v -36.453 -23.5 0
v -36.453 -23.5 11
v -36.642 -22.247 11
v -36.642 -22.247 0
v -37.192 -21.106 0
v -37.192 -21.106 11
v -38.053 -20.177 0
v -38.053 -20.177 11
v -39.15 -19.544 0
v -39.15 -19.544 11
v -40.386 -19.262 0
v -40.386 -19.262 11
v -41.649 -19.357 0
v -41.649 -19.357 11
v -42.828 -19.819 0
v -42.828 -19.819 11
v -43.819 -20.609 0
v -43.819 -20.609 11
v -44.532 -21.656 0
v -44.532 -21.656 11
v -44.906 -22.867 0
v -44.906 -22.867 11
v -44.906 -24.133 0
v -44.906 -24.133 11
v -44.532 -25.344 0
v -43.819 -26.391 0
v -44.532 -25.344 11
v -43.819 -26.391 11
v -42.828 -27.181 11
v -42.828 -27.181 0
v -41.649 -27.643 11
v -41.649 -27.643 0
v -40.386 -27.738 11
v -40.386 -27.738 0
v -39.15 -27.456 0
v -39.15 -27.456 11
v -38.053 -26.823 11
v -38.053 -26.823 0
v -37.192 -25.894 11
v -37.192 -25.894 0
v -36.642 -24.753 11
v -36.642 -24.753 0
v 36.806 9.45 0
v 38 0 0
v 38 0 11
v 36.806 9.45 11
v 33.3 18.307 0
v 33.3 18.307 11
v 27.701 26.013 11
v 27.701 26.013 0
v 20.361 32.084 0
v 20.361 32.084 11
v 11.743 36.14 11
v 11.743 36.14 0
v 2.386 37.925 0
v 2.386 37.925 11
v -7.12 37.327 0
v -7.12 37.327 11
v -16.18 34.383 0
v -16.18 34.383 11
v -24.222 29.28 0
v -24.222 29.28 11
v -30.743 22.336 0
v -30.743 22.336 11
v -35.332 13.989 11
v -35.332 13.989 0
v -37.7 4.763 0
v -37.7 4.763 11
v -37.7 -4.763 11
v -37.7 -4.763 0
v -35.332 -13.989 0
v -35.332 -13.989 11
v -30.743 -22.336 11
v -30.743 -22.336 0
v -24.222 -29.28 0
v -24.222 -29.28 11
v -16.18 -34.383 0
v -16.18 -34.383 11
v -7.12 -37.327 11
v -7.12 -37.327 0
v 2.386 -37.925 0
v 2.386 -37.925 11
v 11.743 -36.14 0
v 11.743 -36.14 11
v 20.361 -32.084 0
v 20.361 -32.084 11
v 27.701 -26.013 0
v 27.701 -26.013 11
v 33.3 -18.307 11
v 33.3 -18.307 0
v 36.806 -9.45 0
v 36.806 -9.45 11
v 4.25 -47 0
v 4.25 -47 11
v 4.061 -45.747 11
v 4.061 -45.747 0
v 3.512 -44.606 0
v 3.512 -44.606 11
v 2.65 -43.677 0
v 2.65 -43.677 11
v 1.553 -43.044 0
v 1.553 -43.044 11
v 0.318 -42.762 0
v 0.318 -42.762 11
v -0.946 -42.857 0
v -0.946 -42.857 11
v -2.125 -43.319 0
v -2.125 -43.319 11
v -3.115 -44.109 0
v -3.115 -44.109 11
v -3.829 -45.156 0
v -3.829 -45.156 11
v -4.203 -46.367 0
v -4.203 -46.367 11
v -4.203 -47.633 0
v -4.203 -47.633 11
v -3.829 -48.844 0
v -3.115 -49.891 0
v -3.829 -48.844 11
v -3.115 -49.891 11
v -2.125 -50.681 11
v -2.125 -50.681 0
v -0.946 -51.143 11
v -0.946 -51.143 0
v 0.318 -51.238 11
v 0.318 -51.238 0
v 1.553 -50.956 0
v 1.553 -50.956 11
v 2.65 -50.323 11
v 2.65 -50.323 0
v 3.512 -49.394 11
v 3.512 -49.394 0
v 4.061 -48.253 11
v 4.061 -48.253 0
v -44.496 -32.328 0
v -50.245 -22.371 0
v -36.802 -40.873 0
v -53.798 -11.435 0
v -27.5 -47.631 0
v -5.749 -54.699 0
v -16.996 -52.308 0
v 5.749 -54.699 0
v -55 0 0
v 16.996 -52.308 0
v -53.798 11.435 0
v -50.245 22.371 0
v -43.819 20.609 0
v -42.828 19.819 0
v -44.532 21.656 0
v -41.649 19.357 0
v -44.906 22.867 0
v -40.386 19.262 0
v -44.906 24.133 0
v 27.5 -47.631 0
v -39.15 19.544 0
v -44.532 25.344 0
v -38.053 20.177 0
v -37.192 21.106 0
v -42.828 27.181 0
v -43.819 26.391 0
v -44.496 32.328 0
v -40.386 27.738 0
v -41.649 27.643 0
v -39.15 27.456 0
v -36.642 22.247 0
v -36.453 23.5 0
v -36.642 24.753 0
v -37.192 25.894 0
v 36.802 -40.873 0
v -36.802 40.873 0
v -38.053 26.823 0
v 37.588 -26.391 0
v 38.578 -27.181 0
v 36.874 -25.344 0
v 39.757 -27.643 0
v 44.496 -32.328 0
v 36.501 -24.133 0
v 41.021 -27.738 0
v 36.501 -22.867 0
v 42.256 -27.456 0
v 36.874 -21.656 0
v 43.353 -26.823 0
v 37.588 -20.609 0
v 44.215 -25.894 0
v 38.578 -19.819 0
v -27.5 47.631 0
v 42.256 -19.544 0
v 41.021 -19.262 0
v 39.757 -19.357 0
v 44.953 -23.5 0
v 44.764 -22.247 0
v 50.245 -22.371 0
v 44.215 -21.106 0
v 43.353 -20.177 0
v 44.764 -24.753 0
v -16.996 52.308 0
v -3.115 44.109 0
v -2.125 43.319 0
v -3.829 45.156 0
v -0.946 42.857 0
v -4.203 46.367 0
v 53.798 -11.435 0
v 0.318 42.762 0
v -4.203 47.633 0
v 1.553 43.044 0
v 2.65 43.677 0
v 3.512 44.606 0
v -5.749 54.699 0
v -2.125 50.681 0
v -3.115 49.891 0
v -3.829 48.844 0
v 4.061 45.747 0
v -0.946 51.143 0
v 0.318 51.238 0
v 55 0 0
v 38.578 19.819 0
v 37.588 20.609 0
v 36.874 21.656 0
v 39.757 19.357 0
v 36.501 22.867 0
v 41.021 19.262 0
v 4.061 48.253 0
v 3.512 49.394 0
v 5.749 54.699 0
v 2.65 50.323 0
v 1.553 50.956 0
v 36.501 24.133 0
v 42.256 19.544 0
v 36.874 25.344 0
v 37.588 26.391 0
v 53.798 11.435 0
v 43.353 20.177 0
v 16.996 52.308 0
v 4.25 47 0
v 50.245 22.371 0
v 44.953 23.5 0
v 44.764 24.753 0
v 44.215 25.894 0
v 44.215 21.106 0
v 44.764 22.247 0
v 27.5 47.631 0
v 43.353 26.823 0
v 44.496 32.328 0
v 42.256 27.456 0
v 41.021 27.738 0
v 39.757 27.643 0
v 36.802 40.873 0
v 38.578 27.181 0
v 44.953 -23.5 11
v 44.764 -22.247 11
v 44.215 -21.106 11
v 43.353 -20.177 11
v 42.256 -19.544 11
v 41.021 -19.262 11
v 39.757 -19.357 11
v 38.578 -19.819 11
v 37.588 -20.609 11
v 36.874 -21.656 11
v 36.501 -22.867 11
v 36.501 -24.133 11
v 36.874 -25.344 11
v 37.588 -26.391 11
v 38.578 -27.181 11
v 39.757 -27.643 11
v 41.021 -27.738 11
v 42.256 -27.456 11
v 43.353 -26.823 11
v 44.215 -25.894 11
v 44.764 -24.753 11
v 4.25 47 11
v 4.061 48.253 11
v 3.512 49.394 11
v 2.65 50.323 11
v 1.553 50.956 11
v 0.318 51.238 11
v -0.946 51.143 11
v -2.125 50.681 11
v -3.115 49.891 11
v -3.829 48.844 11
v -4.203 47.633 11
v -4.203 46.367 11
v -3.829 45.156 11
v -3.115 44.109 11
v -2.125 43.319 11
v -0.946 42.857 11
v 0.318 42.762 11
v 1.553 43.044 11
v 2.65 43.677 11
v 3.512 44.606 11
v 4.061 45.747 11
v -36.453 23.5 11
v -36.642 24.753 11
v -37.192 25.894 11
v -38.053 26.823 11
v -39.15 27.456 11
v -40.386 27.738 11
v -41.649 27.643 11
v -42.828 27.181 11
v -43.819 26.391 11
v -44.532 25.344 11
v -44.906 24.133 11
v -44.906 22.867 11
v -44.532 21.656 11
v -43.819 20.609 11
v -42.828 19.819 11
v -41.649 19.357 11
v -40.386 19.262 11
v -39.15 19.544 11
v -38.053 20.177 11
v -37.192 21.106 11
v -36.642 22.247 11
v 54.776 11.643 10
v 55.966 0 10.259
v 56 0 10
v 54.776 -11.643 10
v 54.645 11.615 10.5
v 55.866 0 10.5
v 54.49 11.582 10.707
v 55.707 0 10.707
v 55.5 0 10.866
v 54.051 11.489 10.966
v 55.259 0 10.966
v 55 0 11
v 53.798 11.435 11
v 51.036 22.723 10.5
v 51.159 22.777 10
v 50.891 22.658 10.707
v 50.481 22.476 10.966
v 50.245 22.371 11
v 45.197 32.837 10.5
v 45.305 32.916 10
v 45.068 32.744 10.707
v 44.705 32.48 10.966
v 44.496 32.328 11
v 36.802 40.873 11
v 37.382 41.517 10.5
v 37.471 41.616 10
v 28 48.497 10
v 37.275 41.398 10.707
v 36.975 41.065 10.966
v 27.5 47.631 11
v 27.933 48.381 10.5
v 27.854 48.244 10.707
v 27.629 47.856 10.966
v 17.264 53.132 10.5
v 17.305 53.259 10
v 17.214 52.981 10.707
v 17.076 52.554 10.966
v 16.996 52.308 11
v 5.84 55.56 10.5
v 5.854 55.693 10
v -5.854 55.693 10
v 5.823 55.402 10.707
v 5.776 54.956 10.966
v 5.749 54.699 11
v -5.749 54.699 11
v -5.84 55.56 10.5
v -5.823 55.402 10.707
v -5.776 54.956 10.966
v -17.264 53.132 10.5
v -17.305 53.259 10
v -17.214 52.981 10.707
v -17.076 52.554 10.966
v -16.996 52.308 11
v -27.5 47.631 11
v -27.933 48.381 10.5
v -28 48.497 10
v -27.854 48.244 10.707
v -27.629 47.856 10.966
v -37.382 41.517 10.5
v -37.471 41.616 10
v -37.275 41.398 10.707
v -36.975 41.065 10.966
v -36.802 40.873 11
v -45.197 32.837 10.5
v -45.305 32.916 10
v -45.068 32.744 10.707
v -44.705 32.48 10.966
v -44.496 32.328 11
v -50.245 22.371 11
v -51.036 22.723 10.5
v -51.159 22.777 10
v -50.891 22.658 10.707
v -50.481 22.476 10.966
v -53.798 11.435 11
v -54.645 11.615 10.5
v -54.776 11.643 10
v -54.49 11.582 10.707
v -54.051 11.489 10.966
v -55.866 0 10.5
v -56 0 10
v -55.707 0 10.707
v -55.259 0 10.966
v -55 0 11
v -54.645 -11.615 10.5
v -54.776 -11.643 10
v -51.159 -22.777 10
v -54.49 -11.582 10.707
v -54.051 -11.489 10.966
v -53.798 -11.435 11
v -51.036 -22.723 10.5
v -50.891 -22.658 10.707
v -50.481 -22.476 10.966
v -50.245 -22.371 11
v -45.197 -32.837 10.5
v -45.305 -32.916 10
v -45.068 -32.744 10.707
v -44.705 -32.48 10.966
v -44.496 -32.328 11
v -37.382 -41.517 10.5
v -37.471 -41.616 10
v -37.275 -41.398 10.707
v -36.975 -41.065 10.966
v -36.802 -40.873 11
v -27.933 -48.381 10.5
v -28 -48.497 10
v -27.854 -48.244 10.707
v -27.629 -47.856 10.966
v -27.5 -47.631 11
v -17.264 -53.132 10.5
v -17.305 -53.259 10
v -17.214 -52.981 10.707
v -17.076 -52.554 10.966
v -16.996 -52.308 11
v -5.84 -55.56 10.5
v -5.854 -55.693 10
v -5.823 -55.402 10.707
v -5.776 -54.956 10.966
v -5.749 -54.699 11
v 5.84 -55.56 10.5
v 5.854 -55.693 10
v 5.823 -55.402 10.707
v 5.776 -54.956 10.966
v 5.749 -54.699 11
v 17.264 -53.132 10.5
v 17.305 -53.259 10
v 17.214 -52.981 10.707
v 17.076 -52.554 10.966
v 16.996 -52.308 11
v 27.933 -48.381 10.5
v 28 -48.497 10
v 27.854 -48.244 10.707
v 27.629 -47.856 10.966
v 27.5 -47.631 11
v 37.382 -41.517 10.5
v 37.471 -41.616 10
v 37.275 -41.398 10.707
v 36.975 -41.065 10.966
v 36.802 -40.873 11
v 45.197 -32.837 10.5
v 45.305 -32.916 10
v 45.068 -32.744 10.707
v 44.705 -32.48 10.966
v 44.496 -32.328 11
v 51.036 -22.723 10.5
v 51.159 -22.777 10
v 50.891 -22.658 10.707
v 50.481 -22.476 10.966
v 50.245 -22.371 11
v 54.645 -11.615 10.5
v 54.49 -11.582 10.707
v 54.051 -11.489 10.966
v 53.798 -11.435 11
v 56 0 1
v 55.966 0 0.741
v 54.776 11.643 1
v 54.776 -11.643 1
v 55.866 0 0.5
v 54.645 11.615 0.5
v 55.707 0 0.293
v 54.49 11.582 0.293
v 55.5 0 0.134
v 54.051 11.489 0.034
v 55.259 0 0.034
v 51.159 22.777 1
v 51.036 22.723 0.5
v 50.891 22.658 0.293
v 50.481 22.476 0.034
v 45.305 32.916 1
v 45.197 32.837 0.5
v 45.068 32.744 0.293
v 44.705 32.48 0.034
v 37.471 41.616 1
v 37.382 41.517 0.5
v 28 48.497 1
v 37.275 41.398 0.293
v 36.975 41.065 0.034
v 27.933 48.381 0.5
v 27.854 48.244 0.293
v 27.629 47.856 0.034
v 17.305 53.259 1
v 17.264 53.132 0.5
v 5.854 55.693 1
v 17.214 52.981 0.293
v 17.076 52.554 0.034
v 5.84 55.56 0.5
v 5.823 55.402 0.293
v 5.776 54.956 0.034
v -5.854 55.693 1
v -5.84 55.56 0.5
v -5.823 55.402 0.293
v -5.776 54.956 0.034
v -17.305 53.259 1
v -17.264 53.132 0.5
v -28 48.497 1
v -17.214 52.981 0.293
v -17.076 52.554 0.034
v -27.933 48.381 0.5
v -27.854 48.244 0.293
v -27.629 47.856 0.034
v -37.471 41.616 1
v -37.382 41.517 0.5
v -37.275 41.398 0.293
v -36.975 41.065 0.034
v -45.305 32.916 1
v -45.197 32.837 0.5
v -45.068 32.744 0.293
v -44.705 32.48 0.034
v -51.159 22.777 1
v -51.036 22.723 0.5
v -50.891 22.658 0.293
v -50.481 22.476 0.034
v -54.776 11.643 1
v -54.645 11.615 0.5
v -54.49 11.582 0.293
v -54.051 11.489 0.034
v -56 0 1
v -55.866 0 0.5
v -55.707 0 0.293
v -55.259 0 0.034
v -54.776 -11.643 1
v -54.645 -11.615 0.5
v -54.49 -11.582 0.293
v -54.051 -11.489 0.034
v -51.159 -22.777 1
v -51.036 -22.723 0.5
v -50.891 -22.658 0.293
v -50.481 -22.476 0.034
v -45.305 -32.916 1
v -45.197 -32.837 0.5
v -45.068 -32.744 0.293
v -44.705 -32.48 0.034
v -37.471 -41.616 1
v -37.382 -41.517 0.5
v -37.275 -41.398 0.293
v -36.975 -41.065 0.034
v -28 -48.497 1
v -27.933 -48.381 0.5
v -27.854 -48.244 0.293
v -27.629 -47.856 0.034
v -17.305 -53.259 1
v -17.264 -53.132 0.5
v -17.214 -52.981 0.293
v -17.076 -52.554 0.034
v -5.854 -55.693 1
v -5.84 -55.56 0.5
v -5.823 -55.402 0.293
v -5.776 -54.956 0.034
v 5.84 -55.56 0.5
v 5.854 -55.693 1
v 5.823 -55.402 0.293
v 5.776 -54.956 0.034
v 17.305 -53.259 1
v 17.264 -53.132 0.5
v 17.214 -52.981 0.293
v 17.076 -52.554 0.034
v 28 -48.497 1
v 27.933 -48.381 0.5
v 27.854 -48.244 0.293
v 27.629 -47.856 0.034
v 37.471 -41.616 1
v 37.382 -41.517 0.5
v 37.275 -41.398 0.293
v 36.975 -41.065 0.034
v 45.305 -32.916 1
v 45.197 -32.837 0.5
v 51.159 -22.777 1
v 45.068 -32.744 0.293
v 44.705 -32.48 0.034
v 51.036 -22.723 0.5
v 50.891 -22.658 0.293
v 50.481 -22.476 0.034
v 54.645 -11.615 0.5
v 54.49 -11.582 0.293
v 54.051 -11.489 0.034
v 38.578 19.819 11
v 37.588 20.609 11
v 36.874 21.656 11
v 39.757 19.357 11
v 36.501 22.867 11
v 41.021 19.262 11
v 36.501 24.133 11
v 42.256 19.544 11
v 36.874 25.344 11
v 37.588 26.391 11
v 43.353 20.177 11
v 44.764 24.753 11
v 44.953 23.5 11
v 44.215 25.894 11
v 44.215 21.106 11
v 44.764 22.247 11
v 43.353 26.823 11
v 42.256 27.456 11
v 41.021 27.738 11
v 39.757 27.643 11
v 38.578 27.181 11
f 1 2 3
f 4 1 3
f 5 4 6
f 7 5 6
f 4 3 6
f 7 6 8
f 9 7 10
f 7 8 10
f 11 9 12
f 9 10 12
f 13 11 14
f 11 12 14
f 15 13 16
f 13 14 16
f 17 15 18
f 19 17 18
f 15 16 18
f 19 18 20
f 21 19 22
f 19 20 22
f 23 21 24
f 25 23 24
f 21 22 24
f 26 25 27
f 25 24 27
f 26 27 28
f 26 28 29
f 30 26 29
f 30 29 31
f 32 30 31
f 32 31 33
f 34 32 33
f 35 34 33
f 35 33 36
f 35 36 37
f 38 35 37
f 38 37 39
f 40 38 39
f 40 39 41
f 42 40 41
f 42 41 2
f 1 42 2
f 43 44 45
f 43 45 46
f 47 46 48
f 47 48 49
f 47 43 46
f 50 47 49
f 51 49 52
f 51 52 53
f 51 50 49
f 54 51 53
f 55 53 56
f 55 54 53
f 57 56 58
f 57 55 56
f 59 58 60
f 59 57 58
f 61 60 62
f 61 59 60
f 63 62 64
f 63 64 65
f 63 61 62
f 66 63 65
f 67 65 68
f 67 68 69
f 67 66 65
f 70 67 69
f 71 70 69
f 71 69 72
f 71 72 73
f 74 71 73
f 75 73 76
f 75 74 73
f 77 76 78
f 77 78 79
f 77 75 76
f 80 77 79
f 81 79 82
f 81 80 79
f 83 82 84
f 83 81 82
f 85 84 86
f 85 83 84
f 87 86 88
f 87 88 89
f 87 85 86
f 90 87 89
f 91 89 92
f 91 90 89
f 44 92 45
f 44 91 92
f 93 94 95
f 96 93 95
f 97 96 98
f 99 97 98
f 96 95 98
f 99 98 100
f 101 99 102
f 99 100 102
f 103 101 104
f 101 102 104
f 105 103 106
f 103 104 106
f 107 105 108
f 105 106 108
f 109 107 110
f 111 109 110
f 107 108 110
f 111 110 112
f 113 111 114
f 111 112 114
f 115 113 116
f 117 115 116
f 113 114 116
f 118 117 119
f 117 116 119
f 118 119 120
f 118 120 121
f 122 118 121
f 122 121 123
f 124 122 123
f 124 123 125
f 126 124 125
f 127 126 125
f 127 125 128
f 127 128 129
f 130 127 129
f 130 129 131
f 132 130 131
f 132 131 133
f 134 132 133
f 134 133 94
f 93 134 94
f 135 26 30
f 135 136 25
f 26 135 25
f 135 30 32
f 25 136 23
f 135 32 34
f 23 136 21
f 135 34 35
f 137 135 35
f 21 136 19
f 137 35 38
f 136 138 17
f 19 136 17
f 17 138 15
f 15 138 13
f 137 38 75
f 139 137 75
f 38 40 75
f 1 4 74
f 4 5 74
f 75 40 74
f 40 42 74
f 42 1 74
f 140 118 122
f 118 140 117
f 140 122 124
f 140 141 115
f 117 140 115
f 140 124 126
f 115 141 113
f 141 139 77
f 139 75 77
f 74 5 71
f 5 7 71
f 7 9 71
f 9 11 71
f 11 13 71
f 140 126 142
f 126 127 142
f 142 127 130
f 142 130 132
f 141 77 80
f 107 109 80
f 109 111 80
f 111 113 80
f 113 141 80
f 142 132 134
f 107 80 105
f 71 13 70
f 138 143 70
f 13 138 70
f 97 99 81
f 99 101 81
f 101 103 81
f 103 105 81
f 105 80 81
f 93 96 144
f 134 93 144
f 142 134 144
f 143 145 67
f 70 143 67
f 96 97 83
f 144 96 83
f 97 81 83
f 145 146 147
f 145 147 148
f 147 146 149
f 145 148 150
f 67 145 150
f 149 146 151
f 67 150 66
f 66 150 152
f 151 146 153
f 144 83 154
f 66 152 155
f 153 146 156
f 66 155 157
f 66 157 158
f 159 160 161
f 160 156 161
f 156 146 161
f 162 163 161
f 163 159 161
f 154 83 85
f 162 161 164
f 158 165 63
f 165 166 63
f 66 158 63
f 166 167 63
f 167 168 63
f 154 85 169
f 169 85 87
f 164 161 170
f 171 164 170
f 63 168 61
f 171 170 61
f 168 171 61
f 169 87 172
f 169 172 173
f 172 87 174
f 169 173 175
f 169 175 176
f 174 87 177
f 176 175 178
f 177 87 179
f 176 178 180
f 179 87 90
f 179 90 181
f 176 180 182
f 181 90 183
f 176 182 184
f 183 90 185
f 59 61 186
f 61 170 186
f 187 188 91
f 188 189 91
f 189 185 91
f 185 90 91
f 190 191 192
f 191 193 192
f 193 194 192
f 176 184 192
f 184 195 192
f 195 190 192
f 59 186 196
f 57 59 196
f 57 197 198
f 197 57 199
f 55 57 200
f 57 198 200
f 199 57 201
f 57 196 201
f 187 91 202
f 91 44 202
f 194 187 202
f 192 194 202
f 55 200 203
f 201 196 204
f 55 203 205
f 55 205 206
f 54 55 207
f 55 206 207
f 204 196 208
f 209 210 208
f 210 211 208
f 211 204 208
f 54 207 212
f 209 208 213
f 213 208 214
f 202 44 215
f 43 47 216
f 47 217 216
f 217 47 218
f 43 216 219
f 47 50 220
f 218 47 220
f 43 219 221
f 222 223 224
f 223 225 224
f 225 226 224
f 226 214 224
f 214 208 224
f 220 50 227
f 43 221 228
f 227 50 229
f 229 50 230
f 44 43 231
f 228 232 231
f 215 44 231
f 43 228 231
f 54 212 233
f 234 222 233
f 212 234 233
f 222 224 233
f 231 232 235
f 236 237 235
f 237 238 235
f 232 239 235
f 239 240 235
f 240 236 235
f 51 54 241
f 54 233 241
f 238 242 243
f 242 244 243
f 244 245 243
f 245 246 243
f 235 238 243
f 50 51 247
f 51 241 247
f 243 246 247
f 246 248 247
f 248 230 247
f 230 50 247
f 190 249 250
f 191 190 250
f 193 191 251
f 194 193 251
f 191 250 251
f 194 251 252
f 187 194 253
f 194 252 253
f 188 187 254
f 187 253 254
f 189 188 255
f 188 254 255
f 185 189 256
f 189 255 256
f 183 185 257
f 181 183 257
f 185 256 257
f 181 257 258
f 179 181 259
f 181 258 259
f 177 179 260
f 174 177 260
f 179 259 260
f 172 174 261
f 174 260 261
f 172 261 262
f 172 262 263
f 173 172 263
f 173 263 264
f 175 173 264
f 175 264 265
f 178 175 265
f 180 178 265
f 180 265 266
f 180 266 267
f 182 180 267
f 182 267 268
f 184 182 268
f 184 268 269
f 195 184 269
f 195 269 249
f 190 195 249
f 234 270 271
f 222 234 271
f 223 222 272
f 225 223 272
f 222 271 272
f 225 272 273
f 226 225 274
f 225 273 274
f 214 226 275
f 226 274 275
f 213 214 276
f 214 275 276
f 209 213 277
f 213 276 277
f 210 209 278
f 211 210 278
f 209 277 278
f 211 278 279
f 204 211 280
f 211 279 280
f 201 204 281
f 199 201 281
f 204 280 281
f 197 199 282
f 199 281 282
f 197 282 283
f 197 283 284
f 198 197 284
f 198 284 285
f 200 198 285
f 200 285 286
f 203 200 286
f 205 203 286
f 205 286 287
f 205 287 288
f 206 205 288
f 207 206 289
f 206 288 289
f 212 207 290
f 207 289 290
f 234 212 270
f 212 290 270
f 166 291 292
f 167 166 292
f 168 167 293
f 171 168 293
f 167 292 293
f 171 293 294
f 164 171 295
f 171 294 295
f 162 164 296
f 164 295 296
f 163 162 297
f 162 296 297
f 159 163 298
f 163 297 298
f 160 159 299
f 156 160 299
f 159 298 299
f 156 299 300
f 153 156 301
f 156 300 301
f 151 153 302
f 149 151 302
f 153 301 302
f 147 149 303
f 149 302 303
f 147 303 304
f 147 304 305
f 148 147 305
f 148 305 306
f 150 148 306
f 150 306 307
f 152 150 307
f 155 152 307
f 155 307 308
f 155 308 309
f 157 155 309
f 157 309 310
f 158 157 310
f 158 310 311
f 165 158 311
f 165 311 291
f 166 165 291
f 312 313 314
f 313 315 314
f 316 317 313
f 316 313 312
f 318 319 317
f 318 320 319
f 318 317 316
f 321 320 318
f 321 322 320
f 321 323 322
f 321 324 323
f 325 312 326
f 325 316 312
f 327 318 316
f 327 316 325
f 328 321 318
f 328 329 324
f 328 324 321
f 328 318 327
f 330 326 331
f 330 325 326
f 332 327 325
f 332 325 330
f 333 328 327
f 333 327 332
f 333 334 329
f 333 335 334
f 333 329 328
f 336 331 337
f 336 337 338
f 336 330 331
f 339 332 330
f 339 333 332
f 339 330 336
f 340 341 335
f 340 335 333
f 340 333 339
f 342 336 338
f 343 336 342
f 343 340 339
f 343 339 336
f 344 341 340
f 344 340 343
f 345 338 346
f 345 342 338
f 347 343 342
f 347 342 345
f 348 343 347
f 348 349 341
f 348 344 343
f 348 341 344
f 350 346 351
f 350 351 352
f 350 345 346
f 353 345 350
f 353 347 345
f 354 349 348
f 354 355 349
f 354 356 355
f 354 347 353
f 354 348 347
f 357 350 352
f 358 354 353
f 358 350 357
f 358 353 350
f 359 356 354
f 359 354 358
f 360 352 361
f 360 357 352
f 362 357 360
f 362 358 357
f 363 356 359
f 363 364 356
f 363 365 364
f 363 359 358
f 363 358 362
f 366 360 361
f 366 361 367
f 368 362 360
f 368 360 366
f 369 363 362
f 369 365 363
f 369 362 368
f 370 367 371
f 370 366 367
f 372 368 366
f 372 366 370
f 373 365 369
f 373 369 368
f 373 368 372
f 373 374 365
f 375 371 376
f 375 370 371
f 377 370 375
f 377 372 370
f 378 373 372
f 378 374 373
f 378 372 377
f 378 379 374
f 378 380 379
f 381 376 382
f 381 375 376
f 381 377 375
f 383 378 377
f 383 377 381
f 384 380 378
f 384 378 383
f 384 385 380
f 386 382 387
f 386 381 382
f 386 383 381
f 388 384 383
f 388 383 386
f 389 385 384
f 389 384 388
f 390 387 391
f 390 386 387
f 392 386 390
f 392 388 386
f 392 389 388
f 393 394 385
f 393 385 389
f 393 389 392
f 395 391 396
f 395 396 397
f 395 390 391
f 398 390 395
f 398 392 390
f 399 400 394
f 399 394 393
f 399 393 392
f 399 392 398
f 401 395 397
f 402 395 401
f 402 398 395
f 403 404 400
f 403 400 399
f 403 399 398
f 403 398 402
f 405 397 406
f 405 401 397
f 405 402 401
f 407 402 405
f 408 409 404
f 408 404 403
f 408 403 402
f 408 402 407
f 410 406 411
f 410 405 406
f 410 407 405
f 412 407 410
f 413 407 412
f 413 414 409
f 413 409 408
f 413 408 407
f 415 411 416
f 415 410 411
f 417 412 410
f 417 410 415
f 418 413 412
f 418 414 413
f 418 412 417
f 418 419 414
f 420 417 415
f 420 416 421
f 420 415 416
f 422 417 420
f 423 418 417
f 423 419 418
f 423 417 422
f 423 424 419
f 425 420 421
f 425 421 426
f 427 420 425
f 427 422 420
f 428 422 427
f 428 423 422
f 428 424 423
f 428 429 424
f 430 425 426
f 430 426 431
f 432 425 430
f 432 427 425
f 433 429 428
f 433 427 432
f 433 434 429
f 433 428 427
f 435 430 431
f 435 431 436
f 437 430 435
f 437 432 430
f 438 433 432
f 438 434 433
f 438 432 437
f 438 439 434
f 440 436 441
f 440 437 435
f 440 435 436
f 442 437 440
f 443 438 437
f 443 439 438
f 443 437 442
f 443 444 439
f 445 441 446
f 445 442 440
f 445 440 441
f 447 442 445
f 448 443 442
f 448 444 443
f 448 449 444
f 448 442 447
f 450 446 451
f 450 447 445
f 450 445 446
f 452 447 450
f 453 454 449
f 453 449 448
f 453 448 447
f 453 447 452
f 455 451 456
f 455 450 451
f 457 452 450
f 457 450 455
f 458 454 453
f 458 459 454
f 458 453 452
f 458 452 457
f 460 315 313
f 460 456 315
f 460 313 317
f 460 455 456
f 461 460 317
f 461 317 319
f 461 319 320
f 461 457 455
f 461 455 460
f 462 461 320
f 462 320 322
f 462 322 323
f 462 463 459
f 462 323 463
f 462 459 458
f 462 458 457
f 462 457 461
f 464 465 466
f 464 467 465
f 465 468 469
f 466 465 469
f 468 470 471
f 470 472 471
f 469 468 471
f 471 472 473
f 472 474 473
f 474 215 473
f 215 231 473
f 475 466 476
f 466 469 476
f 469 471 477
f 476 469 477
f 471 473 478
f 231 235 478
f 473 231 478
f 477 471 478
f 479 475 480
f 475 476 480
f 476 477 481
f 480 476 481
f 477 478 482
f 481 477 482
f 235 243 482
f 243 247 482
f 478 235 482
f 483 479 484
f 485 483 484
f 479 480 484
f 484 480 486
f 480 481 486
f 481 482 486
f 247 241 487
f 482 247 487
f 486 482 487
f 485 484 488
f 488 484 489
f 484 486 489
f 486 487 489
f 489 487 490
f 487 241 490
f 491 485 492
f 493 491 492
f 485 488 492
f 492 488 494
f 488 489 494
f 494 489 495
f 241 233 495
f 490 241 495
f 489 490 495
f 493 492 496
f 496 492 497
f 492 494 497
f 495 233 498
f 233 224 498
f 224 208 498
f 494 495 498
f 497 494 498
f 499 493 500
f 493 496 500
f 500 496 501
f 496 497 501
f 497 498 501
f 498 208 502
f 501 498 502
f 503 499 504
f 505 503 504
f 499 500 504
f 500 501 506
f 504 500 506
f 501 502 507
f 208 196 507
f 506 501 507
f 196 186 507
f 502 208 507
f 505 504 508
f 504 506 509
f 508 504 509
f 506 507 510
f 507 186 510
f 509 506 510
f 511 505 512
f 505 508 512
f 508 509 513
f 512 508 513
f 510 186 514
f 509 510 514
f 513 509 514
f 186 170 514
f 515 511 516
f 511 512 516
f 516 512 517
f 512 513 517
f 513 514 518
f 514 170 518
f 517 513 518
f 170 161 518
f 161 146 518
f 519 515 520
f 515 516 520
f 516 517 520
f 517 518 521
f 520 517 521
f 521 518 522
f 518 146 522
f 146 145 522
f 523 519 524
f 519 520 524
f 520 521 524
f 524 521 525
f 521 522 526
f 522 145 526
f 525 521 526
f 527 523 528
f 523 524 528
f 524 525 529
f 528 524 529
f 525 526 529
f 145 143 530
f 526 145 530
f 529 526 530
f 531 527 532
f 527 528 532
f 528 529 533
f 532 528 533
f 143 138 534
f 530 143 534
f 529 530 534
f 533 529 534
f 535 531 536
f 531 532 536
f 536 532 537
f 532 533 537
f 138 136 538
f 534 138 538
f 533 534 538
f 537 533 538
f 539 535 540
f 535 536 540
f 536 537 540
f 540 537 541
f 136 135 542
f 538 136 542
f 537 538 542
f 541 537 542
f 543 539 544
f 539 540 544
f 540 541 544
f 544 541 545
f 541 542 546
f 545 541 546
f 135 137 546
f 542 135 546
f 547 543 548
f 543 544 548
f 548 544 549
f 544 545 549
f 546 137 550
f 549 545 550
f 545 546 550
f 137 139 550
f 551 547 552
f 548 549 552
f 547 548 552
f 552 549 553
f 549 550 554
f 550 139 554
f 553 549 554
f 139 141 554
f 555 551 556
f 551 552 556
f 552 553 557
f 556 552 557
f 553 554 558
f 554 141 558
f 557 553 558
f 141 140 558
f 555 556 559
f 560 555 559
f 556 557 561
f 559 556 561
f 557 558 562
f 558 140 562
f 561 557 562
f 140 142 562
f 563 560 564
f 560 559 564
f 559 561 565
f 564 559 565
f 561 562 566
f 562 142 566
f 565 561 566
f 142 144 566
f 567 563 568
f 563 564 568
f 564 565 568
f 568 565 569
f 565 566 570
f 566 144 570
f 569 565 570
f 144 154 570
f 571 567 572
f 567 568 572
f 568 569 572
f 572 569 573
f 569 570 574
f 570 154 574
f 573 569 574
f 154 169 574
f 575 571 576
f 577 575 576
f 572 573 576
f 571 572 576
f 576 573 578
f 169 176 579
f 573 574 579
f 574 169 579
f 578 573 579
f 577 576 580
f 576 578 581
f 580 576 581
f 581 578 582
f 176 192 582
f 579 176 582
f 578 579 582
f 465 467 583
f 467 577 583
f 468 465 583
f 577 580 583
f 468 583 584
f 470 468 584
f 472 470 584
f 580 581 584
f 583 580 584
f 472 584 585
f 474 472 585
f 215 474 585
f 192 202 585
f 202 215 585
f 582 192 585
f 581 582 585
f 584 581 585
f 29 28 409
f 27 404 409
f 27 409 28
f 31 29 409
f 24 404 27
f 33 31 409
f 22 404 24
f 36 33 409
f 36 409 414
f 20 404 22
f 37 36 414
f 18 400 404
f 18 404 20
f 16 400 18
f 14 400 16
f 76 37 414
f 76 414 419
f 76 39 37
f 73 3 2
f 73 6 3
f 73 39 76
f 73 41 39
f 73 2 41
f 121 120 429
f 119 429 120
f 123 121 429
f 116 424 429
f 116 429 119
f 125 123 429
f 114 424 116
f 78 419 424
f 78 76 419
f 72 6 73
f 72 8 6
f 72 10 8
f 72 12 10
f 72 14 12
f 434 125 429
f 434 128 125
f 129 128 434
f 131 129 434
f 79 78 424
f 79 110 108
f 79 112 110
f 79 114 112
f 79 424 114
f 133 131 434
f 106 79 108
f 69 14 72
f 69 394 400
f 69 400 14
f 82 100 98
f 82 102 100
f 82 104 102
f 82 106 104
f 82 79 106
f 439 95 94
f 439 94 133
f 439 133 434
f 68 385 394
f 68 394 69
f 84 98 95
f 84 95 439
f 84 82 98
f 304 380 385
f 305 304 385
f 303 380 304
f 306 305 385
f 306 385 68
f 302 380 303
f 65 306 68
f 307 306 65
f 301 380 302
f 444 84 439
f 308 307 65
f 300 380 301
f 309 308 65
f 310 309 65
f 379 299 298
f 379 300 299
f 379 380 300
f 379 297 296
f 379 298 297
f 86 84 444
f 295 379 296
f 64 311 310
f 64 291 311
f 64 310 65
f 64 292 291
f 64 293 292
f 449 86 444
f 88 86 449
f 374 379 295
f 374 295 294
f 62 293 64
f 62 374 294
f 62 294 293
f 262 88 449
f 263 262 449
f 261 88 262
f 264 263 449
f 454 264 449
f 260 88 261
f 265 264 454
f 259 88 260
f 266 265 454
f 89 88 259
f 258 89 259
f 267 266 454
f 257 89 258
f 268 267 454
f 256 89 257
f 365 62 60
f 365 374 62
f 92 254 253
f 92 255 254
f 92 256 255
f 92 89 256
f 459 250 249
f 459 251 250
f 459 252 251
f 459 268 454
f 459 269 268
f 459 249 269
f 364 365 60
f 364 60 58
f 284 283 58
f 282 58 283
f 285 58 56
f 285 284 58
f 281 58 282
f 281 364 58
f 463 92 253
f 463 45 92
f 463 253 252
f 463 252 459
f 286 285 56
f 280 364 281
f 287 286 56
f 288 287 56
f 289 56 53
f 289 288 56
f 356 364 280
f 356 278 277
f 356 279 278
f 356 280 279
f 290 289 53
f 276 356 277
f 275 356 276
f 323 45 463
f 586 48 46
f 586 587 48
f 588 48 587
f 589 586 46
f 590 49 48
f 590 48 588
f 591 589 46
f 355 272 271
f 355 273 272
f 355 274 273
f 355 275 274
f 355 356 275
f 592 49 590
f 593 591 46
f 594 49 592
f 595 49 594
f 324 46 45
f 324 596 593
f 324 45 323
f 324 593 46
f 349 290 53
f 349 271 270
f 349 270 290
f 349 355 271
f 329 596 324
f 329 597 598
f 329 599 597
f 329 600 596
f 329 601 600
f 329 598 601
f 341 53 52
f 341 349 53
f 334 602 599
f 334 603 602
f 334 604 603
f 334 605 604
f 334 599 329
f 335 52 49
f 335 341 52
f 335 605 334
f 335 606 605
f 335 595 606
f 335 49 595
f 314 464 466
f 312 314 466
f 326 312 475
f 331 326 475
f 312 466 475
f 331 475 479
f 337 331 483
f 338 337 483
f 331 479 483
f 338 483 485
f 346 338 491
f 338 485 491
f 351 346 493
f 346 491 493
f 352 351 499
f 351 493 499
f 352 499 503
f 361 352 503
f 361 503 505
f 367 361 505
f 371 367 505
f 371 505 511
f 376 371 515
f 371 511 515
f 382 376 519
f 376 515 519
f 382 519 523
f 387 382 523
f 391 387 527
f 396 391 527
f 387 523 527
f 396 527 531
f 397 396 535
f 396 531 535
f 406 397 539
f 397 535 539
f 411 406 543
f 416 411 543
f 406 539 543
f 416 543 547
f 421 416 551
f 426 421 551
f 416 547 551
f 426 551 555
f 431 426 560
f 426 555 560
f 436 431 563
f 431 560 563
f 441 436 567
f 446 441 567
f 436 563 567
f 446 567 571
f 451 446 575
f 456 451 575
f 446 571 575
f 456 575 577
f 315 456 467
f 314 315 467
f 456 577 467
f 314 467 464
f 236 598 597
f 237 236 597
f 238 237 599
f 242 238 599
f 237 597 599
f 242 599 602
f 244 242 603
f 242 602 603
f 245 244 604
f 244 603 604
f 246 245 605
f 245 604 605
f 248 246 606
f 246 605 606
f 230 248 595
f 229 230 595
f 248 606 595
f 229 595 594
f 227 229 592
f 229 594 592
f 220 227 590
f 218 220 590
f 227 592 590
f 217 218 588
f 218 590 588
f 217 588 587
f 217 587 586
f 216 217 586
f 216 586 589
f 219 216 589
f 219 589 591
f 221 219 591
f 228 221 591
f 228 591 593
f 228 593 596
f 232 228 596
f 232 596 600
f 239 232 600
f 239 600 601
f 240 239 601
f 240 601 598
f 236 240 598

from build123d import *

# Parameters (mm, degrees)
ESQUISSE1_R             = 56
ESQUISSE1_R_2           = 38
BOSS_EXTRU_1_DEPTH      = 11
ESQUISSE2_R             = 4.25
ENL_V_MAT_EXTRU_2_DEPTH = 11
ESQUISSE2_5_R           = 4.25
ENL_V_MAT_EXTRU_3_DEPTH = 12
CONG_1_R                = 1
CONG_2_R                = 1


with BuildPart() as part:
    # Esquisse1 → Boss.-Extru.1 (new body)
    with BuildSketch(Plane.XY):
        Circle(ESQUISSE1_R)
        Circle(ESQUISSE1_R_2, mode=Mode.SUBTRACT)
    extrude(amount=BOSS_EXTRU_1_DEPTH)

    # Esquisse2 → Enl_v. mat.-Extru.2 (cut)
    with BuildSketch(Plane.XY.offset(11)):
        with Locations((0, 47)):
            Circle(ESQUISSE2_R)
    extrude(amount=-ENL_V_MAT_EXTRU_2_DEPTH, mode=Mode.SUBTRACT)

    # Esquisse2_5 → Enl_v. mat.-Extru.3 (cut, through all)
    with BuildSketch(Plane.XY.offset(11)):
        with Locations((0, 47)):
            Circle(ESQUISSE2_5_R)
        with Locations((0, -47)):
            Circle(ESQUISSE2_5_R)
        with Locations((40.703193978, -23.5)):
            Circle(ESQUISSE2_5_R)
        with Locations((40.703193978, 23.5)):
            Circle(ESQUISSE2_5_R)
        with Locations((-40.703193978, 23.5)):
            Circle(ESQUISSE2_5_R)
        with Locations((-40.703193978, -23.5)):
            Circle(ESQUISSE2_5_R)
    extrude(amount=-ENL_V_MAT_EXTRU_3_DEPTH, mode=Mode.SUBTRACT)

    # Cong_1
    cong_1_edges = [part.edges().sort_by_distance(p)[0] for p in [
        (-56, 0, 11),
    ]]
    fillet(cong_1_edges, radius=CONG_1_R)

    # Cong_2
    cong_2_edges = [part.edges().sort_by_distance(p)[0] for p in [
        (-56, 0, 0),
    ]]
    fillet(cong_2_edges, radius=CONG_2_R)


solid = part.part
